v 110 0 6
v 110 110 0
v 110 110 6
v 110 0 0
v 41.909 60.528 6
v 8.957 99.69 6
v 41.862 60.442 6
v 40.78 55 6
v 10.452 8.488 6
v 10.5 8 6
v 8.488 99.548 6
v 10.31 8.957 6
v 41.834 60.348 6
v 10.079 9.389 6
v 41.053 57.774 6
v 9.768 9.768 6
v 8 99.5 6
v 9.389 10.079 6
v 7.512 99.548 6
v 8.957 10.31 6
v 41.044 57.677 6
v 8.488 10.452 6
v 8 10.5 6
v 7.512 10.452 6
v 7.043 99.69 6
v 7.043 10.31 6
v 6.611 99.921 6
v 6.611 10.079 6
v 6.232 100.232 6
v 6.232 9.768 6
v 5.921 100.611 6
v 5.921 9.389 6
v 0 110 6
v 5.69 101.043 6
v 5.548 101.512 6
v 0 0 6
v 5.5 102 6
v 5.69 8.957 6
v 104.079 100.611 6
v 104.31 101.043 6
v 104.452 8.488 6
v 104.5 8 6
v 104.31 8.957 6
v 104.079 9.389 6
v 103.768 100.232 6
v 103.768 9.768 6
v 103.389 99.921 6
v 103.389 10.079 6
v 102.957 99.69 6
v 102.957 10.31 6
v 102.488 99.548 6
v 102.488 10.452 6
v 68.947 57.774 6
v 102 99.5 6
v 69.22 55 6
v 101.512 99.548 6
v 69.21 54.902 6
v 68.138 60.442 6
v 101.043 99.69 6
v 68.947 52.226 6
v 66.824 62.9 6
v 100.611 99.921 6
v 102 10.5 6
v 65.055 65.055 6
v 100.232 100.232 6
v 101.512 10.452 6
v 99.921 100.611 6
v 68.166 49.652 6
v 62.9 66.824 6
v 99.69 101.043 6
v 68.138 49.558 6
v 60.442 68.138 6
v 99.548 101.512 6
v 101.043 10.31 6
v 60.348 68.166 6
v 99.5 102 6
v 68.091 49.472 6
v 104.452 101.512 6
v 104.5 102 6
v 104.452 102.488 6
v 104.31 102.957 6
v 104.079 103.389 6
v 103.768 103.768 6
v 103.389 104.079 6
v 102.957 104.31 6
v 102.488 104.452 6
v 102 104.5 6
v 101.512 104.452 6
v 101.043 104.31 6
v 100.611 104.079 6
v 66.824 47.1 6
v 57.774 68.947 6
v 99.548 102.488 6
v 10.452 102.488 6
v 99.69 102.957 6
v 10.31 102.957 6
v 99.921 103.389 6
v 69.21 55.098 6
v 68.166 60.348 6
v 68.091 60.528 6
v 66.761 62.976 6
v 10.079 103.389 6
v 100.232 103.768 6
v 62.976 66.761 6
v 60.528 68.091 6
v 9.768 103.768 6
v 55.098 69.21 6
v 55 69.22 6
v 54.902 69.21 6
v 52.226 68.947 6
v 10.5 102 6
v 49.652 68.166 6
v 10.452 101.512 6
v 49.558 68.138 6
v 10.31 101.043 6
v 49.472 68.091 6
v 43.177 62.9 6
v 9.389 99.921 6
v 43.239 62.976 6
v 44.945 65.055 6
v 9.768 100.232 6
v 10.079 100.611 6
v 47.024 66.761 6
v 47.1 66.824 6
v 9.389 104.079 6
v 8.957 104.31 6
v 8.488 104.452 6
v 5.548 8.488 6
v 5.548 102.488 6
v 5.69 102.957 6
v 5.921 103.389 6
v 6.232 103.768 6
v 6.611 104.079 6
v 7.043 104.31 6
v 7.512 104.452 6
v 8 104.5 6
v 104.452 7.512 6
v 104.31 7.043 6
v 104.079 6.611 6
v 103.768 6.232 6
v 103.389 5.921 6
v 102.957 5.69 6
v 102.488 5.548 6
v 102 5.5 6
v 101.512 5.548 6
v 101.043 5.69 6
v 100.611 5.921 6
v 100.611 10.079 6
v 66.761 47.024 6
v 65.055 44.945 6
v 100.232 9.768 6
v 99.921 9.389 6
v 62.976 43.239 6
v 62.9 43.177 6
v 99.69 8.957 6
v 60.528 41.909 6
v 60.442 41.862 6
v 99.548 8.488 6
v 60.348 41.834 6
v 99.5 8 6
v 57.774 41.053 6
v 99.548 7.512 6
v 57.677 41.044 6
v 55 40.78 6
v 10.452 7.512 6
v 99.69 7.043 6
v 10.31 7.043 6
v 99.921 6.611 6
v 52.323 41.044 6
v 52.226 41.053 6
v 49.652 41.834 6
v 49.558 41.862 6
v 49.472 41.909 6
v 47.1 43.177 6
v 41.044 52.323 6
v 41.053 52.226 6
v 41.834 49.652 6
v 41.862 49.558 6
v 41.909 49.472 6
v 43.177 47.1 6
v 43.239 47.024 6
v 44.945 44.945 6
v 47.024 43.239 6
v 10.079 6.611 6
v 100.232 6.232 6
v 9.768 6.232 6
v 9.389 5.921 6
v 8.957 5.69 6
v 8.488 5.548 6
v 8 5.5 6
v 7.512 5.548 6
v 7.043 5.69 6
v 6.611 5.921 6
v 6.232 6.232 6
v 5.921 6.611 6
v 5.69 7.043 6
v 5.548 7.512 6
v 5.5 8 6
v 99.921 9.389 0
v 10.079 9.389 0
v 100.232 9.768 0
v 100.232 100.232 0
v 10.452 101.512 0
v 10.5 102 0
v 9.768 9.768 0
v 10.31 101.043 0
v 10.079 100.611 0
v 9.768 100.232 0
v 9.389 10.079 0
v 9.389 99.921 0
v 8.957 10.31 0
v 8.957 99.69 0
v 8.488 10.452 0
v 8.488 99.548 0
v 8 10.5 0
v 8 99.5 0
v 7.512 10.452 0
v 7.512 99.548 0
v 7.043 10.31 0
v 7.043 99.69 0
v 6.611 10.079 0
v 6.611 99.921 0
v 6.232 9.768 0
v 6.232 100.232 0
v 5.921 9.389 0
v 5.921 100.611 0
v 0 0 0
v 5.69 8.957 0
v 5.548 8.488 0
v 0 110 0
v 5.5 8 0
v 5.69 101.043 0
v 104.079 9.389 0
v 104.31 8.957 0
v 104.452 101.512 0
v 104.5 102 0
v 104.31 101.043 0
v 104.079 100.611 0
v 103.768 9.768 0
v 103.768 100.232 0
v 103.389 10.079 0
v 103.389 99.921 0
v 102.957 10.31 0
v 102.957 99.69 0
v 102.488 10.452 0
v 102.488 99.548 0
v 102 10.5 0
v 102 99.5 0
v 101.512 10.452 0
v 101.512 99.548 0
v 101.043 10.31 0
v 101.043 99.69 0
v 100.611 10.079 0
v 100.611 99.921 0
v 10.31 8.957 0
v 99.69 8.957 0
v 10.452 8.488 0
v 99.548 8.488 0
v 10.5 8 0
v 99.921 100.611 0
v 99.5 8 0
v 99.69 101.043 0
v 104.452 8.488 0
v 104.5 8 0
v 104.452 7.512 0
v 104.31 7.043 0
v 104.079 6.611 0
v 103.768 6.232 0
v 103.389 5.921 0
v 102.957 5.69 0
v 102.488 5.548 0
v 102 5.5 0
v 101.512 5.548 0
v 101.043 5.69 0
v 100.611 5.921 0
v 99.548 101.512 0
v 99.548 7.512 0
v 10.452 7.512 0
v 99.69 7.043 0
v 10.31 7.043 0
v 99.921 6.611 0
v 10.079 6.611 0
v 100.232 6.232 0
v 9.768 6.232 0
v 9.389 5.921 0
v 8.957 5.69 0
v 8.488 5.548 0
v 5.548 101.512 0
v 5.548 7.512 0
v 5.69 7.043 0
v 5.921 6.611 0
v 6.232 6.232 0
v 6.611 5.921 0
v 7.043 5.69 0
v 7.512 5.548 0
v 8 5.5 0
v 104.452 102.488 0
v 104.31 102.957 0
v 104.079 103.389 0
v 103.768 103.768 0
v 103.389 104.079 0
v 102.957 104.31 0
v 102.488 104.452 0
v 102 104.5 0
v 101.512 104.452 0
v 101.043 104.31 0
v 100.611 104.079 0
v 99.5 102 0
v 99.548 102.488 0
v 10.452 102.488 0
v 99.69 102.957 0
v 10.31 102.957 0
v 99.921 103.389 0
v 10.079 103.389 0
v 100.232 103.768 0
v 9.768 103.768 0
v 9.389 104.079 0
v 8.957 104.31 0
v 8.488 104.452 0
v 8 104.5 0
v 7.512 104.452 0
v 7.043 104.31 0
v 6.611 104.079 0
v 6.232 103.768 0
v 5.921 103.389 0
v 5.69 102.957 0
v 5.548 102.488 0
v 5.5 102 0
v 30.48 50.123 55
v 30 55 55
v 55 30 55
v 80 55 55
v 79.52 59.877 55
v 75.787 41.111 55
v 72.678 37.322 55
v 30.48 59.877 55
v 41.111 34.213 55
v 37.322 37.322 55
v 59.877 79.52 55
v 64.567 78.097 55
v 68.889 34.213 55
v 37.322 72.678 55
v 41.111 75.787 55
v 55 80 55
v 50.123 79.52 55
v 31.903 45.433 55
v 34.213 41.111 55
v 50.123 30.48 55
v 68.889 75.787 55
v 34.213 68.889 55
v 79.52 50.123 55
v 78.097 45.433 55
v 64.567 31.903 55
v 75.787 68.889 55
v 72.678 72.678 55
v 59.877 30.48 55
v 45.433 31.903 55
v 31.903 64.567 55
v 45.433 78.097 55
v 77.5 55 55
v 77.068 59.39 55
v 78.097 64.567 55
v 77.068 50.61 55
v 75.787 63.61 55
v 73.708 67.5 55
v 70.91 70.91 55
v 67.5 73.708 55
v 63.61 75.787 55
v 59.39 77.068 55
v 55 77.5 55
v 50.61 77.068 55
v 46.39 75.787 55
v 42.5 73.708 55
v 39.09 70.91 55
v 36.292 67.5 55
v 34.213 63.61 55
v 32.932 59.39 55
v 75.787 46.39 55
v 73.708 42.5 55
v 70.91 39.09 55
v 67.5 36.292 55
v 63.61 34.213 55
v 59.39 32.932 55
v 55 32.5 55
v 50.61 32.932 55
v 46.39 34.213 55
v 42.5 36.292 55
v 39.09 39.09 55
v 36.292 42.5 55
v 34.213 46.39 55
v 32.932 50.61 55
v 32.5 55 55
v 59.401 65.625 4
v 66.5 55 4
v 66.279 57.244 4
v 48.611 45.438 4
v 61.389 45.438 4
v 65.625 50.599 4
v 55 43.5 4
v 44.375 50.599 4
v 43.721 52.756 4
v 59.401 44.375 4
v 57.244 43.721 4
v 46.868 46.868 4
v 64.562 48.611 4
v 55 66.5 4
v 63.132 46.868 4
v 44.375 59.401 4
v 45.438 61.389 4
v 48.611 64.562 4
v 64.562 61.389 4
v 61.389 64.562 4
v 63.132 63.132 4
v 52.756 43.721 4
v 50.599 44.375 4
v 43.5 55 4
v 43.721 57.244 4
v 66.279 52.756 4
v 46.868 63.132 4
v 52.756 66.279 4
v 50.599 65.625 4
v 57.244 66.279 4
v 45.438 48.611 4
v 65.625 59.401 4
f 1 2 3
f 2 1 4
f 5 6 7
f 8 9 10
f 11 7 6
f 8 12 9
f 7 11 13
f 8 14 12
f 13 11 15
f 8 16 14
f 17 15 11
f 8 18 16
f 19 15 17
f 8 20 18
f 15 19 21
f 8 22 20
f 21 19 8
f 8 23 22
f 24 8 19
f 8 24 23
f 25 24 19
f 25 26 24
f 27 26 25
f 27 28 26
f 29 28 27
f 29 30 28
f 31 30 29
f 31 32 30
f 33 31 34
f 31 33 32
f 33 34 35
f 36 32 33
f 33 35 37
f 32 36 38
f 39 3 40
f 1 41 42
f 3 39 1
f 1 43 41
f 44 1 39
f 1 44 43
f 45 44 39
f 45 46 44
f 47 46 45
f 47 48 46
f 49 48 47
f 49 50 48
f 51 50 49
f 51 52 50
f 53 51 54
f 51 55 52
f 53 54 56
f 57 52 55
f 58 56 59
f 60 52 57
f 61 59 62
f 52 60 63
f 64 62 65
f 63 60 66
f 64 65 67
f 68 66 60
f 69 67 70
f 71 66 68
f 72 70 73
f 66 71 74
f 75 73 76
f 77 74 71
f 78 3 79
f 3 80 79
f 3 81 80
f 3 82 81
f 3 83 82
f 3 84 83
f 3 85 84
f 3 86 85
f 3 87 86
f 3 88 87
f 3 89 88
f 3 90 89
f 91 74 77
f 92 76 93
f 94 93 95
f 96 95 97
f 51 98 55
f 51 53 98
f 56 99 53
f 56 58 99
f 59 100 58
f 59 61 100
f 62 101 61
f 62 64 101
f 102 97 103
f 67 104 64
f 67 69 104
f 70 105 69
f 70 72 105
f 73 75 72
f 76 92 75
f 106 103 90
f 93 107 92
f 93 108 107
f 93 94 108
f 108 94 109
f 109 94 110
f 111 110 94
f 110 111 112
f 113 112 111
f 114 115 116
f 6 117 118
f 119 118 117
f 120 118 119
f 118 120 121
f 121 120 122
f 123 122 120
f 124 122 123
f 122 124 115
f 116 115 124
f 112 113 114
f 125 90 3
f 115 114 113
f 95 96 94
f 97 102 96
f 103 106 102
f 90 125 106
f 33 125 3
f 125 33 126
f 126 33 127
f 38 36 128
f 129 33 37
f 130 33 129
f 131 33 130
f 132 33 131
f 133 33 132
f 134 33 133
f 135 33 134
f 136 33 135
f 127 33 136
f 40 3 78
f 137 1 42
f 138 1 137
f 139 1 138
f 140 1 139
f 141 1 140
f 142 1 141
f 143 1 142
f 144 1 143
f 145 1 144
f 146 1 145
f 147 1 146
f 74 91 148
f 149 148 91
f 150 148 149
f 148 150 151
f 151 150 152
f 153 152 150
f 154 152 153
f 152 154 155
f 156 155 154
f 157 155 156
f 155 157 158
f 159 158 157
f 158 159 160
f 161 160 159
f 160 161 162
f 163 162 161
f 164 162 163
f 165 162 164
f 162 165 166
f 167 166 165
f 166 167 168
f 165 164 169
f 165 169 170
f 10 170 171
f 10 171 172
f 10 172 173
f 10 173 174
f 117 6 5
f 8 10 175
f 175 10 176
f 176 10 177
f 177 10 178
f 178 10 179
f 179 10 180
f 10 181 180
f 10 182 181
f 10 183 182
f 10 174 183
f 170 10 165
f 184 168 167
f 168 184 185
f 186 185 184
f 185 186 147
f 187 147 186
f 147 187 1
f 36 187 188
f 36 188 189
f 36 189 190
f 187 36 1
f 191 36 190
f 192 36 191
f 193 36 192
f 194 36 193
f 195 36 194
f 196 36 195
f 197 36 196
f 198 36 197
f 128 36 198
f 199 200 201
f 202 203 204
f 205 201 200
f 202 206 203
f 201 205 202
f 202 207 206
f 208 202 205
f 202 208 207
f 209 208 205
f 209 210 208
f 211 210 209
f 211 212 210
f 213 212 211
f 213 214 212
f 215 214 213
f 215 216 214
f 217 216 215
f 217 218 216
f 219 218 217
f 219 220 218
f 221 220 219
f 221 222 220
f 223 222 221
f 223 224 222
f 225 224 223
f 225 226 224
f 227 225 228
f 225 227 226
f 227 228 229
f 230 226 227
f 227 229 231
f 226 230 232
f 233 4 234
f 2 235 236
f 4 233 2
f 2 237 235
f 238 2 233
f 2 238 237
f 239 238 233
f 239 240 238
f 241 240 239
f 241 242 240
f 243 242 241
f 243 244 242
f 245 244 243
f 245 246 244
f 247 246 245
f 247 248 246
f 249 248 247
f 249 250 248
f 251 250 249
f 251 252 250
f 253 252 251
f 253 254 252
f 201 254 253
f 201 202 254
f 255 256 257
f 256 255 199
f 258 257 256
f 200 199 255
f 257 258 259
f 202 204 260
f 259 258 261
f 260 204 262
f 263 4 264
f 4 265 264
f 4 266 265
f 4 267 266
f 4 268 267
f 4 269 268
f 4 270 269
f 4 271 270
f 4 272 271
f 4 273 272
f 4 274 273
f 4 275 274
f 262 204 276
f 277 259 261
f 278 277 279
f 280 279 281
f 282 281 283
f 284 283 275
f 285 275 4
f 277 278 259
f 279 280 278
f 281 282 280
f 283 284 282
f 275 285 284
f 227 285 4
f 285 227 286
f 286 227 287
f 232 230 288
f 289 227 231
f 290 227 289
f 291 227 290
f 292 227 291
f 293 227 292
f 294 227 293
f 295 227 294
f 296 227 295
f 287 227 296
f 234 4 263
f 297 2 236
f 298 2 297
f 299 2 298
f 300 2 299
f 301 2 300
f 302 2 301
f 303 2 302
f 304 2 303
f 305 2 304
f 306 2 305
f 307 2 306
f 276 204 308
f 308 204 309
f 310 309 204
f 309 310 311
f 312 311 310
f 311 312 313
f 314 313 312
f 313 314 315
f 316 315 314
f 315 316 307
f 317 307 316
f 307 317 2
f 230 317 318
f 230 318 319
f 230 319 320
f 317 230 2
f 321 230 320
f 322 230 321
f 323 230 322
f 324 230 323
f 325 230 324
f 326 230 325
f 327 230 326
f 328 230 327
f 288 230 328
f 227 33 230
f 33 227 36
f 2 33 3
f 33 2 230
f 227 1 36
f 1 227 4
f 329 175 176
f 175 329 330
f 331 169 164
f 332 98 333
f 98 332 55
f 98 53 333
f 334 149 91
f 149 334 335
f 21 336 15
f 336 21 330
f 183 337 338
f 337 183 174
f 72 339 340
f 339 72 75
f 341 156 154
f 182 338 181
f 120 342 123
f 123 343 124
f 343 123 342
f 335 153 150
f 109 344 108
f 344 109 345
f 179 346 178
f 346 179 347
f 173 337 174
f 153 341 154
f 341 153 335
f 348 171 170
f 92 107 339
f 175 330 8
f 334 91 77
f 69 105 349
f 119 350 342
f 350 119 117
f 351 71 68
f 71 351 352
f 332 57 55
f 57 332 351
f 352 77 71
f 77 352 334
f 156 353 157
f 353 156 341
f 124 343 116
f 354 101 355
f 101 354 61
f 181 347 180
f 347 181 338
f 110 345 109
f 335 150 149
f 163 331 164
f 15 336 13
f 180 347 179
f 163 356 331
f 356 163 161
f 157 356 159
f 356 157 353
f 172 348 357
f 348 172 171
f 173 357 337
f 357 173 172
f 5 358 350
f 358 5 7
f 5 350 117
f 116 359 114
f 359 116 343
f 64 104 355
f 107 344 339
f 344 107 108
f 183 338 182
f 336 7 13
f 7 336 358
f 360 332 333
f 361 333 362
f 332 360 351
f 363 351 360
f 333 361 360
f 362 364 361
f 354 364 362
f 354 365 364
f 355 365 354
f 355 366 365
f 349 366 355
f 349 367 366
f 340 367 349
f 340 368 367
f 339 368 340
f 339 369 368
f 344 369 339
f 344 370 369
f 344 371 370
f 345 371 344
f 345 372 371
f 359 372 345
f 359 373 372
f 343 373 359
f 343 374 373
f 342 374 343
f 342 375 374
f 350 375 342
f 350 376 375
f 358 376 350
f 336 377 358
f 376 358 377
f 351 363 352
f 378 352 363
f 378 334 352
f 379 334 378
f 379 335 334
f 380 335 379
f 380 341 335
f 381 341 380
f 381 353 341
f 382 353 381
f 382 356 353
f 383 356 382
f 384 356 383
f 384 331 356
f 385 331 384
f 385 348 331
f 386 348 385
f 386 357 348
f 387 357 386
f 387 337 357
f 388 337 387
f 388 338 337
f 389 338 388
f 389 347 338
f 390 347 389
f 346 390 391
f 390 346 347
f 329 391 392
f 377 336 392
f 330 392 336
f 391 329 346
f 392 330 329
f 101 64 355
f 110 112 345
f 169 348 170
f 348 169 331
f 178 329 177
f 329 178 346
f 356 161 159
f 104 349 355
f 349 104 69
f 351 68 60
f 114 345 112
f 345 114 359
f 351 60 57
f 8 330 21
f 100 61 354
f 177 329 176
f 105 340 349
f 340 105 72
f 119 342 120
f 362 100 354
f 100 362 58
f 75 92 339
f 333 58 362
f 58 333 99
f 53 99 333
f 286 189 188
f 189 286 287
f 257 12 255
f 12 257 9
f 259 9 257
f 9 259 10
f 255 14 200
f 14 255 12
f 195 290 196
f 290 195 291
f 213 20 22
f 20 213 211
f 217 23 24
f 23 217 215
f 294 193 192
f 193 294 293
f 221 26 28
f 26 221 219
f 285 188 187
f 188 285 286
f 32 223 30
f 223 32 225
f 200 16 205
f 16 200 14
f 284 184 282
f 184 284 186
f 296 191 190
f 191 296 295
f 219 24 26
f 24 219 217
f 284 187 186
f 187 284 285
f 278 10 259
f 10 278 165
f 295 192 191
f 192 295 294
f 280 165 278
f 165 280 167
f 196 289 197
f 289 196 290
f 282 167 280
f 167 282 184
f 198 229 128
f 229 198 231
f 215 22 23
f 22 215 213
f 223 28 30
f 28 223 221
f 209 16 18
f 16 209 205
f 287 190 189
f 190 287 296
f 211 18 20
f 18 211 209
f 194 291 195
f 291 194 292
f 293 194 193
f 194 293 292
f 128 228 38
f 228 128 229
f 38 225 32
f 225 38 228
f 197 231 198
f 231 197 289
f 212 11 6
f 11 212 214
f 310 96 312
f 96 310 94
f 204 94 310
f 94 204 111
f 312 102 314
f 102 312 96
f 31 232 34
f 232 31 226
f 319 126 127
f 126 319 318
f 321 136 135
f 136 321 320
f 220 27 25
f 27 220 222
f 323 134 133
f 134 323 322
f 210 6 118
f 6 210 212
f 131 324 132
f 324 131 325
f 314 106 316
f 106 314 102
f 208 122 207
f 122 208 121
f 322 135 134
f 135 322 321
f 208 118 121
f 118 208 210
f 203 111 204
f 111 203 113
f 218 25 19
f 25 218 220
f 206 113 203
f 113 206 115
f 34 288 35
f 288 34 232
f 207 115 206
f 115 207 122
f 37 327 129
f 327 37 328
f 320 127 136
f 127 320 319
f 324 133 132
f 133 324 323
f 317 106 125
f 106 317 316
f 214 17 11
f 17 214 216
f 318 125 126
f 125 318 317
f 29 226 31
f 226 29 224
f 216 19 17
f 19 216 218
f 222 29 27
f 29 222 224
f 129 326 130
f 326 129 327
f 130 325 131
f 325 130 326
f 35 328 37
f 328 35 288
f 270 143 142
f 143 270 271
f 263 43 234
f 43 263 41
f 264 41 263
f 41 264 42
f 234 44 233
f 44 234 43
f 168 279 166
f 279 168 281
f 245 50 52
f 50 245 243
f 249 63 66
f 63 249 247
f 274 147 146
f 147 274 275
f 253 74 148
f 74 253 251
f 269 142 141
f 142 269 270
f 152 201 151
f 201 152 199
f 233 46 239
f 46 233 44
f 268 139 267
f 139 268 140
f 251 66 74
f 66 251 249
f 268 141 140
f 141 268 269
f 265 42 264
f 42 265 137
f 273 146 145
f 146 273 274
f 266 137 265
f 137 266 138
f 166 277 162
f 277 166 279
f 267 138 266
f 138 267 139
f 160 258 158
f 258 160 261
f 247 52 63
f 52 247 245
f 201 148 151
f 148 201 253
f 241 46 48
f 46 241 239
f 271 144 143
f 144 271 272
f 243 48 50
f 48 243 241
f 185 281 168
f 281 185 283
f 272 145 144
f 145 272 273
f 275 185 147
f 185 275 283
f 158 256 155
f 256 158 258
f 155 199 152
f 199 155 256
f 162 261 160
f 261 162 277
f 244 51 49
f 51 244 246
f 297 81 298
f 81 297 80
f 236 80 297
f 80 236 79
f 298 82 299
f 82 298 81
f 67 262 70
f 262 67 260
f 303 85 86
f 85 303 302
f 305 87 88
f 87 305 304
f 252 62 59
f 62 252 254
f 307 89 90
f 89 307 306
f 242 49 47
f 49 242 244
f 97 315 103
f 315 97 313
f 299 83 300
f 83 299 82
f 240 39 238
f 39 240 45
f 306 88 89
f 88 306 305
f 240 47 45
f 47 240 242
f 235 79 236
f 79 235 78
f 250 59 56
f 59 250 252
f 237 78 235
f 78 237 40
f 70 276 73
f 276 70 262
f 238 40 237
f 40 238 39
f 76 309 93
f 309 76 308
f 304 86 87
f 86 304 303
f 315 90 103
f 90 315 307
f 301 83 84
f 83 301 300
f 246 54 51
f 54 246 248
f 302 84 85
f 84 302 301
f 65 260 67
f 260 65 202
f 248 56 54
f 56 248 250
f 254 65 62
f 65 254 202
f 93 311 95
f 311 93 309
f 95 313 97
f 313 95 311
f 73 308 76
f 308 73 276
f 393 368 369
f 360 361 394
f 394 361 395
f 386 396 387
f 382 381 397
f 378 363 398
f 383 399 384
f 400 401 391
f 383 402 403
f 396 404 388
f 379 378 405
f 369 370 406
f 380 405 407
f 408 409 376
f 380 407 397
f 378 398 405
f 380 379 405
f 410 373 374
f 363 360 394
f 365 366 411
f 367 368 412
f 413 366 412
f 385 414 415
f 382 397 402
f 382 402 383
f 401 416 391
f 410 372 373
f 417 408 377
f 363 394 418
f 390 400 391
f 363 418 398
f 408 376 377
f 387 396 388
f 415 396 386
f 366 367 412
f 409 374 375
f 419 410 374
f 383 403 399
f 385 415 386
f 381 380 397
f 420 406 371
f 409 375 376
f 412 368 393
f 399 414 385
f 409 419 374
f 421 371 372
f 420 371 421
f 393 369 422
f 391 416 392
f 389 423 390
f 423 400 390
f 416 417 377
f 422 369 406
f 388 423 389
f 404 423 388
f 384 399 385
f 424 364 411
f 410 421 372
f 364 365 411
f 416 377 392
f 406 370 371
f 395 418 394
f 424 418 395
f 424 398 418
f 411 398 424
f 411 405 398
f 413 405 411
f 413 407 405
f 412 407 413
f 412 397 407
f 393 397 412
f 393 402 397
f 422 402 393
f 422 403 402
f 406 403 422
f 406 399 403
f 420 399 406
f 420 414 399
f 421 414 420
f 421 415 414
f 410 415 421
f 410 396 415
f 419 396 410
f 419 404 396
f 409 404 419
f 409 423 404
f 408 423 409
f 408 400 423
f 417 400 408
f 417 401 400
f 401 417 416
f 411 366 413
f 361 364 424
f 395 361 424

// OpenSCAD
$fn = 32;

// ----------------------------------------------------------------------
// Hopper: flanged with square flange
// ----------------------------------------------------------------------

// --- parameters (mm) ---
fl = 110;                 // flange side, X and Y
fl_t = 6;                 // flange thickness
cone_h = 50;              // cone height above the flange
top_d = 50;               // cone mouth diameter
bot_d = 28;               // cone spout diameter
wall = 2.5;               // cone wall thickness
hole_r = 2.5;             // flange hole radius
hole_in = 8;              // hole inset from the corners
fit_tol = 0.02;           // tolerance for press fits, mm
free_tol = 0.2;           // tolerance for clearance fits, mm

bore_d = bot_d - 2 * wall;  // spout bore diameter
total_h = fl_t + cone_h - 1;  // overall height

difference() {
  union() {
    cube([fl, fl, fl_t]);
    translate([fl / 2, fl / 2, fl_t - 1])
      cylinder(h = cone_h, d1 = bot_d, d2 = top_d);
  }
  translate([fl / 2, fl / 2, fl_t - 2])
    cylinder(h = cone_h + 1, d1 = bore_d, d2 = top_d - 2 * wall);
  for (sx = [0, 1], sy = [0, 1])
    translate([sx ? fl - hole_in : hole_in,
               sy ? fl - hole_in : hole_in, -1])
      cylinder(r = hole_r, h = fl_t + 2);
}
